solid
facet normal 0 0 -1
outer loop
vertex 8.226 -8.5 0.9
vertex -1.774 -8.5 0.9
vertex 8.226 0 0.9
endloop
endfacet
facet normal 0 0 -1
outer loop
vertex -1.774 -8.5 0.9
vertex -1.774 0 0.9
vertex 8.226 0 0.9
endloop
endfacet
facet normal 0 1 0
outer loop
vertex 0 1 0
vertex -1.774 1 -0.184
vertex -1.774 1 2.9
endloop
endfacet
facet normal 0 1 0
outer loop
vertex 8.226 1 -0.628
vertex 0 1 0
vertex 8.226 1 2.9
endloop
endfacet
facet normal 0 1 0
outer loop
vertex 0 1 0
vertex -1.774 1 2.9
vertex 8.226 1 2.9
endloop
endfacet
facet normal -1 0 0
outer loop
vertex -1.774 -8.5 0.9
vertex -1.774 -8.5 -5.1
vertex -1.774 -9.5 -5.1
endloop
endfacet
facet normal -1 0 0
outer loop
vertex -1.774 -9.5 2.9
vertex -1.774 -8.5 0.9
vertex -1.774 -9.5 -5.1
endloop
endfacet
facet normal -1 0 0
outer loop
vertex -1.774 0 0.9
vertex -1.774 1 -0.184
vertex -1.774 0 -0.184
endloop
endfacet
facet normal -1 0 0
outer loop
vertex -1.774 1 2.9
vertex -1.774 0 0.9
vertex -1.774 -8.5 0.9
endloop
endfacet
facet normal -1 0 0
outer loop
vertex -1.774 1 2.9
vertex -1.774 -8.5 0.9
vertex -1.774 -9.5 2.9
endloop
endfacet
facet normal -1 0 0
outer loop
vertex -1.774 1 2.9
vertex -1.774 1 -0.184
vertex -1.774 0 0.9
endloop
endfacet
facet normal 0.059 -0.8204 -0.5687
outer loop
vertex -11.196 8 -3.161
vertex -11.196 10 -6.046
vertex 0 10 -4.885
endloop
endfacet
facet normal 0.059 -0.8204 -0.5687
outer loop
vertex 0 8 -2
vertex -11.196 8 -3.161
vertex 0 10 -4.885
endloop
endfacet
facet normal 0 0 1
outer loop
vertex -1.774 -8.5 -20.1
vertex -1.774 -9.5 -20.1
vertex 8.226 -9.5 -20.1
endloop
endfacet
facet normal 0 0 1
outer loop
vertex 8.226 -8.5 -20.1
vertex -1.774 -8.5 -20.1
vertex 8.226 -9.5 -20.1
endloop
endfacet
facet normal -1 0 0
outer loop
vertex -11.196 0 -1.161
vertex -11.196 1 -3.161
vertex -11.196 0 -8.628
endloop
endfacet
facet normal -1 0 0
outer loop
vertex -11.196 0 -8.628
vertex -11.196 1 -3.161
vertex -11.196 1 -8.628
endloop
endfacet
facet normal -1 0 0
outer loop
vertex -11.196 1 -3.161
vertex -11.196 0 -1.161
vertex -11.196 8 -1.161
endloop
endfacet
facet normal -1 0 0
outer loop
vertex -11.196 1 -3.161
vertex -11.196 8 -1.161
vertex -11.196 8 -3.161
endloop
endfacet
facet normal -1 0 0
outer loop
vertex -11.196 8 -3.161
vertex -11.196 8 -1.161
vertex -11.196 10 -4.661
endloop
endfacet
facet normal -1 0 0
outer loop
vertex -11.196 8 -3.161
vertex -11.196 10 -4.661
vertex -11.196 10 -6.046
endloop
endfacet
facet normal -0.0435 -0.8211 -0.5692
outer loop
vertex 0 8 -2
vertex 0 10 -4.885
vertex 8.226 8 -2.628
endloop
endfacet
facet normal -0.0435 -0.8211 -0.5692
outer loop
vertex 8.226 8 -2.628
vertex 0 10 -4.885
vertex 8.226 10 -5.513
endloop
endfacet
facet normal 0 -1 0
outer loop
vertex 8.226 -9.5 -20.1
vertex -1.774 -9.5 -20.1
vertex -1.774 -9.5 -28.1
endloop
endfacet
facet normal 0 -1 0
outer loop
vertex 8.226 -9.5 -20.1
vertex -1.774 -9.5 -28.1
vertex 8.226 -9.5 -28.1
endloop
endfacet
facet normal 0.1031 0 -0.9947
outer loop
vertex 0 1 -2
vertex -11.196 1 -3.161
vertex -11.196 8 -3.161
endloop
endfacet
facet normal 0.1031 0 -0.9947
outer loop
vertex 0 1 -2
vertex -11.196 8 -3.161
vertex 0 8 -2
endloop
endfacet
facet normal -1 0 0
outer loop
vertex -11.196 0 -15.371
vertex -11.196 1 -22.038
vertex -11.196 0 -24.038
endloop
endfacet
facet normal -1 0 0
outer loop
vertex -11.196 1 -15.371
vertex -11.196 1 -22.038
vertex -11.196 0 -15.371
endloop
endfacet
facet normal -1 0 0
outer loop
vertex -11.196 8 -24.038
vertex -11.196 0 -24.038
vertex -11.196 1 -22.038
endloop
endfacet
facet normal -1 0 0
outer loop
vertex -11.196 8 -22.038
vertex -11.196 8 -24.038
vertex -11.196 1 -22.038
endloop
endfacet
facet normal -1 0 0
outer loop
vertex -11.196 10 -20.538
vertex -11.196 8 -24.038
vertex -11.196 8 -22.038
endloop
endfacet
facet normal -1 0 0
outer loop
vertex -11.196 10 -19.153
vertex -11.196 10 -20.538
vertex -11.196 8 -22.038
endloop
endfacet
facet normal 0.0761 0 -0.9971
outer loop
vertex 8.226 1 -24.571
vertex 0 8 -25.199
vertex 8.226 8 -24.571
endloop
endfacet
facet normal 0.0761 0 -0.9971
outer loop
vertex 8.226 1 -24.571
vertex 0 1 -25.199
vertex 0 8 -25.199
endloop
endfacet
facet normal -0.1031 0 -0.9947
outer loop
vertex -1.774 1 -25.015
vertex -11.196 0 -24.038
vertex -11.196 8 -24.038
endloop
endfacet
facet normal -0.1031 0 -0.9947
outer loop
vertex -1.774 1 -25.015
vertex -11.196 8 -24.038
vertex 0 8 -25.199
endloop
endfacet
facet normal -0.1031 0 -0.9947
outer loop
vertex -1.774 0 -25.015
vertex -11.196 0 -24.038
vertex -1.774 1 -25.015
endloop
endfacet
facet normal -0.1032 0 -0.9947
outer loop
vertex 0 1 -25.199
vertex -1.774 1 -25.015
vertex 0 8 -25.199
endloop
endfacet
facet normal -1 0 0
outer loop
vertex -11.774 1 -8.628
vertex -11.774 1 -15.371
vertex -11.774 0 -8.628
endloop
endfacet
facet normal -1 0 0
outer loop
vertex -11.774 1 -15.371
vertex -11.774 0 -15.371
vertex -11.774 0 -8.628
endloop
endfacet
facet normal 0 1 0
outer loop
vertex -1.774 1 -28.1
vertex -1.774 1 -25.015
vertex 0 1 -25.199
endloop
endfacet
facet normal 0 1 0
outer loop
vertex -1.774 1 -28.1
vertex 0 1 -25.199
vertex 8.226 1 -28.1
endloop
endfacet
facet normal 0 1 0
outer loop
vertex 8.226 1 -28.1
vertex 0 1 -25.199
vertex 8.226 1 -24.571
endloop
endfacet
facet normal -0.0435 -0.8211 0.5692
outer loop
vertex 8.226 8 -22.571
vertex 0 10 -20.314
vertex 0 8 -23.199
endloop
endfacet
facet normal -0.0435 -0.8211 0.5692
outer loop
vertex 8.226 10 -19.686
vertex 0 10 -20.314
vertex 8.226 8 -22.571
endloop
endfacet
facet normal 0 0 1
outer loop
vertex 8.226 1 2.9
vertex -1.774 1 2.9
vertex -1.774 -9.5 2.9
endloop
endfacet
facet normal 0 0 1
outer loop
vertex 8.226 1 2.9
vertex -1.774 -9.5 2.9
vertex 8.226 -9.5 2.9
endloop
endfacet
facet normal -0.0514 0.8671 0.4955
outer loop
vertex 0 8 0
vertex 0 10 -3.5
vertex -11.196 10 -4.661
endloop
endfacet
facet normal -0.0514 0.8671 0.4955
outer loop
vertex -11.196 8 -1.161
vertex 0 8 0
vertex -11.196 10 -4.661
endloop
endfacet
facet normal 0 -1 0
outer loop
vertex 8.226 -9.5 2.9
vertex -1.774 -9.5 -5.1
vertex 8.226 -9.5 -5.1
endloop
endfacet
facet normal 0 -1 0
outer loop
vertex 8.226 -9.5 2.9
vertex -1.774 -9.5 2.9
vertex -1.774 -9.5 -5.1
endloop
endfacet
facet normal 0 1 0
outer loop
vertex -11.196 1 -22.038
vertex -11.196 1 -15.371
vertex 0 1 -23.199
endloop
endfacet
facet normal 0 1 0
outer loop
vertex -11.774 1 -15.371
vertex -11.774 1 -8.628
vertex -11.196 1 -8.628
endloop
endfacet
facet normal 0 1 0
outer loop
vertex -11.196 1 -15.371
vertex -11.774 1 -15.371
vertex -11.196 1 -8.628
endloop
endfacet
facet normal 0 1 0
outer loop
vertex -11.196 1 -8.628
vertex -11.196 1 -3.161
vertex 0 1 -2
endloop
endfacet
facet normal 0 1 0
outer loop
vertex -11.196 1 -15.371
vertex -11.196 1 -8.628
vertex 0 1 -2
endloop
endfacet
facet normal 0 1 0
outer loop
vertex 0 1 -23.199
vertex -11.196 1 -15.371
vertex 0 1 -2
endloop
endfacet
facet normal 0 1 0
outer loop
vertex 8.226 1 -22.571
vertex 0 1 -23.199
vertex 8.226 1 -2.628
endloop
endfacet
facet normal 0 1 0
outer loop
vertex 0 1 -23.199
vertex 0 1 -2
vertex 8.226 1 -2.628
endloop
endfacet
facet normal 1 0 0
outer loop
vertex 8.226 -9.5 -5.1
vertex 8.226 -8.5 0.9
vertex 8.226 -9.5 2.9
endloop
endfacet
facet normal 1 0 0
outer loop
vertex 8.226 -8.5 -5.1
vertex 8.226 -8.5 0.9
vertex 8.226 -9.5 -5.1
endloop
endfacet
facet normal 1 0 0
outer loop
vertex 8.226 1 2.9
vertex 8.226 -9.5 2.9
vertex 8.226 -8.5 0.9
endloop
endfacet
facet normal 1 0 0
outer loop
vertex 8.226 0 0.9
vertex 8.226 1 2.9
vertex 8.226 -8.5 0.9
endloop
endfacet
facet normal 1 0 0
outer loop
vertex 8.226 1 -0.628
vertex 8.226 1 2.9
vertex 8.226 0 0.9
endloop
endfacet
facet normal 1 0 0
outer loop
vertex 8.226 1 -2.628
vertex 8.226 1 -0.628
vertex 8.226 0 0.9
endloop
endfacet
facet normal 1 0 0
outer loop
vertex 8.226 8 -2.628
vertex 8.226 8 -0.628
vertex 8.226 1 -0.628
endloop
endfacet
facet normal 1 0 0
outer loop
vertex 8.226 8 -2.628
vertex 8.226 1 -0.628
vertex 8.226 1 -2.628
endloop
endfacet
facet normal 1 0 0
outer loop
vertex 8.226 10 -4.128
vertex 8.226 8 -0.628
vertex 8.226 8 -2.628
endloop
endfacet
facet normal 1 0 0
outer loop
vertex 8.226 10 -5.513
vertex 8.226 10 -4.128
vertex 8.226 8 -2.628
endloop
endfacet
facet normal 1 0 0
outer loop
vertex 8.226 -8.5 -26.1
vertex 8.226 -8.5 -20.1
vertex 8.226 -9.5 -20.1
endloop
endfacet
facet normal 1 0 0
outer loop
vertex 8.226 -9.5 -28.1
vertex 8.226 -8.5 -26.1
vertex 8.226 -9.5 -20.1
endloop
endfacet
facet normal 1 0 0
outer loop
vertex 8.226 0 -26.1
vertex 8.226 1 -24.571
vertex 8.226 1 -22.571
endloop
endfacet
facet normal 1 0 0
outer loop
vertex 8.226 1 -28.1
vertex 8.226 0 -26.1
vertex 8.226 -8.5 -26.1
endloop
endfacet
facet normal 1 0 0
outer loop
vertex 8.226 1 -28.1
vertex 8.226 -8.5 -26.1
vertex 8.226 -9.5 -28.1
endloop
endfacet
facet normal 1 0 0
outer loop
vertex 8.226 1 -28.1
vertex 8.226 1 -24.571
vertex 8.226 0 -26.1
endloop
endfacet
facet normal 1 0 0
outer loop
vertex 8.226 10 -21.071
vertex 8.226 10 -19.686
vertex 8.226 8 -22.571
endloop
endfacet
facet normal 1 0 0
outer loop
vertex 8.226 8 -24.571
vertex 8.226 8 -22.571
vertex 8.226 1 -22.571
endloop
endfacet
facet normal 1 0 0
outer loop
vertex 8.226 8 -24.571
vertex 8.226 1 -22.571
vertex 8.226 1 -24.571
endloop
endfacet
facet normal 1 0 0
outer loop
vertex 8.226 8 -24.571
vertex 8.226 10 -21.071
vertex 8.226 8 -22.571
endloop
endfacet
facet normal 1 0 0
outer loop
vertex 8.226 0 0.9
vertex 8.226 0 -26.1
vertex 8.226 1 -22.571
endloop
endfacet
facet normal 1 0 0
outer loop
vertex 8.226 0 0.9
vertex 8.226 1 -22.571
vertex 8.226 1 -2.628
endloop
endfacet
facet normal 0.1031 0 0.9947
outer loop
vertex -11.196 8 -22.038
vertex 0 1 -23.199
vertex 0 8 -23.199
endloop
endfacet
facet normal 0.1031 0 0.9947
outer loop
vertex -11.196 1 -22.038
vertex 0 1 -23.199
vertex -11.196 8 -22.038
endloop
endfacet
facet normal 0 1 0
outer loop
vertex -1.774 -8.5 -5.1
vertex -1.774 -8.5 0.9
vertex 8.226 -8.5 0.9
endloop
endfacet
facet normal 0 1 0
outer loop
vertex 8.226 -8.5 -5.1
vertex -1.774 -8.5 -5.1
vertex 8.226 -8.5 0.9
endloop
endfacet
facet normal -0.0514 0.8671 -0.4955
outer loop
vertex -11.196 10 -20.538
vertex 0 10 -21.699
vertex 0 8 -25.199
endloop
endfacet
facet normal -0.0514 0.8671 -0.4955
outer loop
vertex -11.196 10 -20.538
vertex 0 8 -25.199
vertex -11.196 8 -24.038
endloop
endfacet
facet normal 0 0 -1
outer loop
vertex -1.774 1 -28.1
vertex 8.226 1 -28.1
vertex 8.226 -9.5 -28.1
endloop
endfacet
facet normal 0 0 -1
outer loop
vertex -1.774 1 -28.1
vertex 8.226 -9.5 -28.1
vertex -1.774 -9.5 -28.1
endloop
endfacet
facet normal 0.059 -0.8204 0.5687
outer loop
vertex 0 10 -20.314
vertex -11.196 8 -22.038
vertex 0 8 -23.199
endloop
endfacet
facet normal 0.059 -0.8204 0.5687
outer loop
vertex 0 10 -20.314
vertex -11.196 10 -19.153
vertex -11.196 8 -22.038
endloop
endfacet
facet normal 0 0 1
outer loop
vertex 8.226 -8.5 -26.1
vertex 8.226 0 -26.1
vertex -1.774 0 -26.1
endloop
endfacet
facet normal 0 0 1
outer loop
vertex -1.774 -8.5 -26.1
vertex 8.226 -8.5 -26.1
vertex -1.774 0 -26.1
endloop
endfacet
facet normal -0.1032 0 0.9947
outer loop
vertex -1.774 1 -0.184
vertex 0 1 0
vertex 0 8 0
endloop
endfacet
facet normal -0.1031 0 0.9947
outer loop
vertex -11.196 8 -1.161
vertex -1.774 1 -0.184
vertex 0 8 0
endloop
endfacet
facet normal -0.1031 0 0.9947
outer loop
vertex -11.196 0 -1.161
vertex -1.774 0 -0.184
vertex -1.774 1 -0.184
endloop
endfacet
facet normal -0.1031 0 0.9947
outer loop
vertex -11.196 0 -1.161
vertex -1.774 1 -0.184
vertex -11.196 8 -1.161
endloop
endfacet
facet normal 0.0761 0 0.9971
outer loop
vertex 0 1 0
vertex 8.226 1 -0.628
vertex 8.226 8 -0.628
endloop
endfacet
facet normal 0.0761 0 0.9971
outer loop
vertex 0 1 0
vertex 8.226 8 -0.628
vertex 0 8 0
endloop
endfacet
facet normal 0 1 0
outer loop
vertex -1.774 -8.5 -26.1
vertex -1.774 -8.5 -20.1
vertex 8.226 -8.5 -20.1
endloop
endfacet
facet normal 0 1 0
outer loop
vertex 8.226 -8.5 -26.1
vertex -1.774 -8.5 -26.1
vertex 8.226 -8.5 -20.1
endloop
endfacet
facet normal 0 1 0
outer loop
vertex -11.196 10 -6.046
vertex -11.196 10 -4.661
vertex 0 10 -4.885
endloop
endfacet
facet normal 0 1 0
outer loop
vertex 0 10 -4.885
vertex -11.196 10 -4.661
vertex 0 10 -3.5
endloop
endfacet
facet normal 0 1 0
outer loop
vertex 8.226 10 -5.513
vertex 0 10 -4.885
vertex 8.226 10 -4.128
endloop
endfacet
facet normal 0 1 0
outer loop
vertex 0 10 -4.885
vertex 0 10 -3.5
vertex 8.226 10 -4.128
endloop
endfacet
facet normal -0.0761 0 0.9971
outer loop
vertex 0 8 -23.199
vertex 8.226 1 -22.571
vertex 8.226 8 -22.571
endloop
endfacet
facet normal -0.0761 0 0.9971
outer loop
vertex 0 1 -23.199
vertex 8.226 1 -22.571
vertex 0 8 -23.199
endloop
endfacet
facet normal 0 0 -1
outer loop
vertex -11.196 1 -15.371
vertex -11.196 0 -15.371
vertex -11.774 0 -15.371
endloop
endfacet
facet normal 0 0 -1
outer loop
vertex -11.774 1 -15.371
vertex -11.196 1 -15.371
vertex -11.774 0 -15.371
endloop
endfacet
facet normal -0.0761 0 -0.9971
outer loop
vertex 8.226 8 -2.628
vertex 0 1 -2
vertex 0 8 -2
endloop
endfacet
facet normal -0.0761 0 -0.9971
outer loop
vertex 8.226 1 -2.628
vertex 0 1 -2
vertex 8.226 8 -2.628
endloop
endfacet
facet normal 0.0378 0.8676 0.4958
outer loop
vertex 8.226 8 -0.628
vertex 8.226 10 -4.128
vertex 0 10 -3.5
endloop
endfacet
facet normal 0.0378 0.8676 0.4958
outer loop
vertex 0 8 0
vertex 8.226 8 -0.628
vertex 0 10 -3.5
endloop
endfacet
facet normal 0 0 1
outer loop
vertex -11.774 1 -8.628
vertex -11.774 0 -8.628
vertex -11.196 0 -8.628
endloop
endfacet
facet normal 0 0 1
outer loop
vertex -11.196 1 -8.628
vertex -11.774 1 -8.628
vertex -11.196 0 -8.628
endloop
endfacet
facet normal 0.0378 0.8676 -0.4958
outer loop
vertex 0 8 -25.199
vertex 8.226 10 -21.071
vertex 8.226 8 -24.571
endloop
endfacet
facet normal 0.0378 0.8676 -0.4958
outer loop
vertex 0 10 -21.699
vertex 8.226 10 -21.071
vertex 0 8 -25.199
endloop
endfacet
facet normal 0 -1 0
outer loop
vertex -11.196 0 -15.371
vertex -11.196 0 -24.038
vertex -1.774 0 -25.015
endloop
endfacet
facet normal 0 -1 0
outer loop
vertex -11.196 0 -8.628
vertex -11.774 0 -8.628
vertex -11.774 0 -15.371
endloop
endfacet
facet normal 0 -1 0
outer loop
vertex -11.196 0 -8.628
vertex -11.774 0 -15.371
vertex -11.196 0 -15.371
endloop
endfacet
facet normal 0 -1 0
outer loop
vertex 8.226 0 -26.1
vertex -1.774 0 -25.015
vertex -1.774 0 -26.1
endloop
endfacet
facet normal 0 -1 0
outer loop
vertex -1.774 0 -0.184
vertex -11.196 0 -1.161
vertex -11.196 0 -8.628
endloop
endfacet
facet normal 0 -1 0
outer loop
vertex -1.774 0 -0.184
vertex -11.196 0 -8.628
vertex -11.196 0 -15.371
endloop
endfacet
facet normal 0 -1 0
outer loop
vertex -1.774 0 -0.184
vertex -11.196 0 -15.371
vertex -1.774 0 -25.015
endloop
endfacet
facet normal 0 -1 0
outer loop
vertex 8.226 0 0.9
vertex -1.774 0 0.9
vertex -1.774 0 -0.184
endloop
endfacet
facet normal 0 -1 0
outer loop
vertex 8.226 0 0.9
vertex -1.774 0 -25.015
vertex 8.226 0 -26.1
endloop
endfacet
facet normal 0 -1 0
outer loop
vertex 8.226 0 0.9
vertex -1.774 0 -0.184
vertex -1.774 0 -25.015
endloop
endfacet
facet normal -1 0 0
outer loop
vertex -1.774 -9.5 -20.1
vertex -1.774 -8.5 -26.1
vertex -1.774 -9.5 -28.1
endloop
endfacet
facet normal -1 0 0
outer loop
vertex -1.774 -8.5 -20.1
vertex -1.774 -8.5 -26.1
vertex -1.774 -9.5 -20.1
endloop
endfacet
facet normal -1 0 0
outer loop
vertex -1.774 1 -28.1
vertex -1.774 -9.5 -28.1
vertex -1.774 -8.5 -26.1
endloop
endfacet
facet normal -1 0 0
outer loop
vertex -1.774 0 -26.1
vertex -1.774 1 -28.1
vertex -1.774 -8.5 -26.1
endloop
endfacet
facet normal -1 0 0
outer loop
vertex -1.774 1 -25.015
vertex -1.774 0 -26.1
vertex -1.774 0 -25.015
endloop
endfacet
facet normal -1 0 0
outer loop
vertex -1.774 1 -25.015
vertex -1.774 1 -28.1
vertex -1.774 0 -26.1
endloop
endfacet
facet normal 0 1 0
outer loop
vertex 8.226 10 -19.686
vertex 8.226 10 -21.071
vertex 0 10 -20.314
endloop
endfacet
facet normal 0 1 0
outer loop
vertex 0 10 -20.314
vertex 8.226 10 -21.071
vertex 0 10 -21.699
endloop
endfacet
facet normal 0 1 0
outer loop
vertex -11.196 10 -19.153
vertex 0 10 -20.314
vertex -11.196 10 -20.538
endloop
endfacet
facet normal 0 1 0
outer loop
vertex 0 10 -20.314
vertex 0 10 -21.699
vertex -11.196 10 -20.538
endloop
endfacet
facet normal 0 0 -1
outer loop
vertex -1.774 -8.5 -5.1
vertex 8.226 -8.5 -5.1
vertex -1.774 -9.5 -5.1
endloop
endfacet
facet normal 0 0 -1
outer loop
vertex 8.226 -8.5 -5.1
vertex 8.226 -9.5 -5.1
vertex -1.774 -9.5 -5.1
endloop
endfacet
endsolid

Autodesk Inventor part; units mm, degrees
ref_plane "YZ Plane" through (0, 0, 0) normal (1, 0, 0) x (0, 1, 0)
ref_plane "XZ Plane" through (0, 0, 0) normal (0, 1, 0) x (-1, 0, 0)
ref_plane "XY Plane" through (0, 0, 0) normal (0, 0, 1) x (1, 0, 0)
sketch "Esquisse3" plane through (0, 0, 0) normal (0, 1, 0) x (-1, 0, 0)
  line L0 (0, 0) -> (11.196, -1.161)
  line L1 (11.196, -1.161) -> (11.196, -3.161)
  line L2 (11.196, -3.161) -> (0, -2)
  line L3 (0, -2) -> (-8.226, -2.628)
  line L4 (-8.226, -2.628) -> (-8.226, -0.628)
  line L5 (-8.226, -0.628) -> (0, 0)
  line L6 (0, 0) -> (0, -2) construction
  dimension "d10" = 0.628
  dimension "d11" = 1.161
  dimension "d12" = 11.256
  dimension "d13" = 8.226
  dimension "d14" = 2
extrude "Extrusion1" add sketch "Esquisse3" along normal blind 8
ref_plane "Plan de construction1" through (0, 10, 0) normal (0, 1, 0) x (1, 0, 0)
sketch "Esquisse4" plane through (0, 10, 0) normal (0, 1, 0) x (1, 0, 0)
  line L0 (8.226, 0.628) -> (8.226, 2.628) construction
  line L1 (8.226, 2.628) -> (0, 2) construction
  line L2 (8.226, 2.628) -> (0, 2) construction
  line L3 (0, 2) -> (-11.196, 3.161) construction
  line L4 (0, 2) -> (-11.196, 3.161) construction
  line L5 (-11.196, 3.161) -> (-11.196, 4.661) construction
  line L6 (-11.196, 4.661) -> (0, 3.5)
  line L7 (0, 3.5) -> (8.226, 4.128)
  line L8 (8.226, 2.628) -> (8.226, 4.128) construction
  line L9 (0, 2) -> (0, 3.5) construction
  line L10 (-11.196, 4.661) -> (-11.196, 6.0463)
  line L11 (-11.196, 6.0463) -> (-0.0003, 4.8853)
  line L12 (-0.0003, 4.8853) -> (8.226, 5.5133)
  line L13 (8.226, 5.5133) -> (8.226, 4.128)
  point P0 (0, 0)
  dimension "d18" = 1.5
  dimension "d19" = 1.5
  dimension "d20" = 1.5
loft "Lissage1" add profiles "Esquisse4" section 1 edges at (-5.598, 8, -0.5805) (4.113, 8, -0.314) (8.226, 8, -1.628) (4.113, 8, -2.314) (-5.598, 8, -2.5805) (-11.196, 8, -2.161)
sketch "Esquisse9" plane through (0, 0, 0) normal (0, -1, 0) x (1, 0, 0)
  line L0 (8.226, -0.628) -> (0, 0) projected
  line L1 (8.226, -0.628) -> (0, 0)
  line L2 (0, 0) -> (-11.196, -1.161) projected
  line L3 (0, 0) -> (-11.196, -1.161)
  line L4 (-11.196, -1.161) -> (-11.196, -22.84)
  line L5 (-11.196, -22.84) -> (0, -24)
  line L6 (0, -24) -> (8.226, -23.371)
  line L7 (8.226, -0.628) -> (8.226, -2.628) projected
  line L8 (8.226, -23.371) -> (8.226, -0.628)
  line L9 (0, 0) -> (0, -24) construction
  dimension "d29" = 24
  dimension "d30" = 22.743
  dimension "d31" = 21.679
extrude "Extrusion2" add sketch "Esquisse9" against normal blind 1
sketch "Esquisse10" plane through (0, 0, 0) normal (0, -1, 0) x (1, 0, 0)
  line L0 (8.226, -15.371) -> (-11.774, -15.371)
  line L1 (-11.774, -15.371) -> (-11.774, -8.628)
  line L2 (-11.774, -8.628) -> (8.226, -8.628)
  line L3 (8.226, -8.628) -> (8.226, -15.371)
  point P0 (8.226, -23.371)
  point P1 (8.226, -0.628)
  dimension "d34" = 8
  dimension "d35" = 8
  dimension "d36" = 20
extrude "Extrusion3" add sketch "Esquisse10" against normal blind 1
ref_plane "Plan de construction3" through (-11.196, 0, -12.5995) normal (0, 0, -1) x (-1, 0, 0)
mirror "Symétrie2" about plane through (-11.196, 0, -12.5995) normal (0, 0, -1) of "Extrusion1", "Lissage1"
sketch "Esquisse11" plane through (0, 0, 0) normal (0, -1, 0) x (1, 0, 0)
  line L0 (8.226, -28.0995) -> (-1.774, -28.0995)
  line L1 (-1.774, -28.0995) -> (-1.774, 2.9005)
  line L2 (-1.774, 2.9005) -> (8.226, 2.9005)
  line L3 (8.226, 2.9005) -> (8.226, -28.0995) construction
  line L4 (8.226, -28.0995) -> (8.226, -24.571)
  line L5 (8.226, -24.571) -> (8.226, -0.628) projected
  line L6 (8.226, -0.628) -> (8.226, 2.9005)
  point P0 (0, 0)
  dimension "d40" = 31
  dimension "d41" = 10
extrude "Extrusion4" add sketch "Esquisse11" against normal blind 1
sketch "Esquisse12" plane through (0, 0, 0) normal (0, -1, 0) x (1, 0, 0)
  line L0 (8.226, -28.0995) -> (-1.774, -28.0995) projected
  line L1 (8.226, -28.0995) -> (-1.774, -28.0995)
  line L2 (-1.774, -28.0995) -> (-1.774, -26.0995)
  line L3 (-1.774, -28.0995) -> (-1.774, -25.015) construction
  line L4 (8.226, -24.571) -> (8.226, -28.0995) construction
  line L5 (8.226, -26.0995) -> (-1.774, -26.0995)
  line L6 (8.226, -28.0995) -> (8.226, -26.0995)
  point P0 (0, 0)
  dimension "d44" = 2
extrude "Extrusion5" add sketch "Esquisse12" along normal blind 8.5
mirror "Symétrie3" about plane through (-11.196, 0, -12.5995) normal (0, 0, -1) of "Extrusion5"
sketch "Esquisse13" plane through (0, -8.5, 0) normal (0, -1, 0) x (1, 0, 0)
  line L0 (8.226, -24.571) -> (8.226, -28.0995) projected
  line L1 (-1.774, 2.9005) -> (8.226, 2.9005) projected
  line L2 (8.226, -28.0995) -> (-1.774, -28.0995)
  line L3 (-1.774, -28.0995) -> (-1.774, 2.9005)
  line L4 (-1.774, 2.9005) -> (8.226, 2.9005)
  line L5 (8.226, 2.9005) -> (8.226, -28.0995)
  point P0 (0, 0)
extrude "Extrusion6" add sketch "Esquisse13" along normal blind 1
sketch "Esquisse14" plane through (0, -9.5, 0) normal (0, -1, 0) x (1, 0, 0)
  line L0 (-1.774, -26.0995) -> (-1.774, 0.9005) construction
  line L1 (8.226, 0.9005) -> (8.226, -26.0995) construction
  line L2 (-1.774, -20.0995) -> (8.226, -20.0995)
  line L3 (8.226, -20.0995) -> (8.226, -5.0995)
  line L4 (8.226, -5.0995) -> (-1.774, -5.0995)
  line L5 (-1.774, -5.0995) -> (-1.774, -20.0995)
  line L6 (-1.774, -28.0995) -> (8.226, -28.0995) construction
  line L7 (8.226, 2.9005) -> (-1.774, 2.9005) construction
  line L8 (-1.774, -20.0995) -> (-1.774, -5.0995)
  line L9 (8.226, -5.0995) -> (8.226, -20.0995)
  point P0 (0, 0)
  dimension "d49" = 8
  dimension "d50" = 8
extrude "Extrusion7" cut sketch "Esquisse14" against normal blind 1
properties part number "ESCFixation"
